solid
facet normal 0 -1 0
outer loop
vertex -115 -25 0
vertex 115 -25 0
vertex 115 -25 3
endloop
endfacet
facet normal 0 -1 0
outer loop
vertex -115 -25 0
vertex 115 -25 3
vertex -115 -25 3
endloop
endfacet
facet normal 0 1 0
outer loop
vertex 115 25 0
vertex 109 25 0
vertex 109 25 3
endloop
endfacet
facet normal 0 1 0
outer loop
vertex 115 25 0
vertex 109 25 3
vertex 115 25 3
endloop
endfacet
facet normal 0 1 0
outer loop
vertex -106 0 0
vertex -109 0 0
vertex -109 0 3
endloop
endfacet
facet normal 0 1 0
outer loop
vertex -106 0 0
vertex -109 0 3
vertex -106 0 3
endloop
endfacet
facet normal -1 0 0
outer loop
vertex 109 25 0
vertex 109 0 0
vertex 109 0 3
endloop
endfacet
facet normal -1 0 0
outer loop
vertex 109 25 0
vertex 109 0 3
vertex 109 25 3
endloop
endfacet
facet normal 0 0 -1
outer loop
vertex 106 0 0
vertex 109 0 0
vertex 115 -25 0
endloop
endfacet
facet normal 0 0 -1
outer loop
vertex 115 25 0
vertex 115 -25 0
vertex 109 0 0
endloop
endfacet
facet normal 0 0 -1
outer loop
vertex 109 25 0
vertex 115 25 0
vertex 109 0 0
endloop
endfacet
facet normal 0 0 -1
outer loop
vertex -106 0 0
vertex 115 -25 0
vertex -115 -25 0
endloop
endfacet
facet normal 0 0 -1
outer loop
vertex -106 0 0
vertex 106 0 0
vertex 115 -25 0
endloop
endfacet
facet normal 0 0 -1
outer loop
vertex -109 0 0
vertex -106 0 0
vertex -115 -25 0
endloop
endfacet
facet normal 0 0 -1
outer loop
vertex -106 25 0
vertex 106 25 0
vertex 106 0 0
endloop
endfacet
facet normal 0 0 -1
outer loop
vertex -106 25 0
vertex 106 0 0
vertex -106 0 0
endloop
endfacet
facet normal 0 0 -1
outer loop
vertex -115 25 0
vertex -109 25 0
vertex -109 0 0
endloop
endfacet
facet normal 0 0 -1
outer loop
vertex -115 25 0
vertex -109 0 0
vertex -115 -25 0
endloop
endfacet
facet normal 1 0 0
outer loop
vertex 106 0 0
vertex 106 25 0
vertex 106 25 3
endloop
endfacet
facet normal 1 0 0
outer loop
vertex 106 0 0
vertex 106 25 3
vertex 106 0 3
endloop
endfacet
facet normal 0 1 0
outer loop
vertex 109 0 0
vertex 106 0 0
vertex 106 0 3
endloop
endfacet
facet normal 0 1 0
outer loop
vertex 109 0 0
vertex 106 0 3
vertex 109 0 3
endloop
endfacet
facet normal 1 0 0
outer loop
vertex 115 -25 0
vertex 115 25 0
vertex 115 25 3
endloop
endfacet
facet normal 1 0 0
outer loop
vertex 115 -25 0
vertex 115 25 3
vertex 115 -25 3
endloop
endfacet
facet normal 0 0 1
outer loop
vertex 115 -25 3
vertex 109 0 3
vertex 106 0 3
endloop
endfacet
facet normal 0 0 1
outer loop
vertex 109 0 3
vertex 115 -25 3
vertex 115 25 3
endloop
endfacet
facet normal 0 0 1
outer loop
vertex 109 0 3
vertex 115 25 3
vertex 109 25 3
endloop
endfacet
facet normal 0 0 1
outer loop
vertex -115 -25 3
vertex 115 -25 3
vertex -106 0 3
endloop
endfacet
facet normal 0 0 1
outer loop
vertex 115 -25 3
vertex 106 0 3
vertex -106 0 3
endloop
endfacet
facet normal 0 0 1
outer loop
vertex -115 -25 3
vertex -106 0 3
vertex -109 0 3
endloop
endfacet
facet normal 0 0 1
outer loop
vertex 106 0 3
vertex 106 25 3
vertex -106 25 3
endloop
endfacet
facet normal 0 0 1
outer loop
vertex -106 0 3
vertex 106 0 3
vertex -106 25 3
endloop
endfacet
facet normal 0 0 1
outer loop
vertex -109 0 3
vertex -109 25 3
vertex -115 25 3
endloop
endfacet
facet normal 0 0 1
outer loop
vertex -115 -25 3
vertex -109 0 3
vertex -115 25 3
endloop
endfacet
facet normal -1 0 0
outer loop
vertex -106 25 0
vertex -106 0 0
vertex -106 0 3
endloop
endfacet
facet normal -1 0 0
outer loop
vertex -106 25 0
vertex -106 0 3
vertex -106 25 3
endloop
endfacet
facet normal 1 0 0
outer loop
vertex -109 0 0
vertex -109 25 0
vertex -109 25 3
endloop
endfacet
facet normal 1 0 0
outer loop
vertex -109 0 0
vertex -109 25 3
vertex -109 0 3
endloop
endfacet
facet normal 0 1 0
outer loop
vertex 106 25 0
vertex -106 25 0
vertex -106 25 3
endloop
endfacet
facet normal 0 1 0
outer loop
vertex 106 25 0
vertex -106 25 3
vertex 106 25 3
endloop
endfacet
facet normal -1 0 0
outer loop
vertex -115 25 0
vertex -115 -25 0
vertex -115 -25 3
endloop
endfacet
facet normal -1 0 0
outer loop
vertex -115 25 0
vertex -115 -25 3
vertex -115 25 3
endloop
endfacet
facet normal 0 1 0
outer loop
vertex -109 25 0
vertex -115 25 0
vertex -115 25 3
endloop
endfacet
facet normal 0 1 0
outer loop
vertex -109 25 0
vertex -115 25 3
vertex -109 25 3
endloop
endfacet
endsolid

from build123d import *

# Parameters (mm, degrees)
BOSS_EXTRU_1_DEPTH = 3


with BuildPart() as part:
    # Esquisse1 → Boss.-Extru.1 (new body)
    with BuildSketch(Plane.XY):
        Polygon((-109, 25), (-109, 0), (-106, 0), (-106, 25), (106, 25), (106, 0), (109, 0), (109, 25), (115, 25), (115, -25), (-115, -25), (-115, 25), align=None)
    extrude(amount=BOSS_EXTRU_1_DEPTH)


solid = part.part
